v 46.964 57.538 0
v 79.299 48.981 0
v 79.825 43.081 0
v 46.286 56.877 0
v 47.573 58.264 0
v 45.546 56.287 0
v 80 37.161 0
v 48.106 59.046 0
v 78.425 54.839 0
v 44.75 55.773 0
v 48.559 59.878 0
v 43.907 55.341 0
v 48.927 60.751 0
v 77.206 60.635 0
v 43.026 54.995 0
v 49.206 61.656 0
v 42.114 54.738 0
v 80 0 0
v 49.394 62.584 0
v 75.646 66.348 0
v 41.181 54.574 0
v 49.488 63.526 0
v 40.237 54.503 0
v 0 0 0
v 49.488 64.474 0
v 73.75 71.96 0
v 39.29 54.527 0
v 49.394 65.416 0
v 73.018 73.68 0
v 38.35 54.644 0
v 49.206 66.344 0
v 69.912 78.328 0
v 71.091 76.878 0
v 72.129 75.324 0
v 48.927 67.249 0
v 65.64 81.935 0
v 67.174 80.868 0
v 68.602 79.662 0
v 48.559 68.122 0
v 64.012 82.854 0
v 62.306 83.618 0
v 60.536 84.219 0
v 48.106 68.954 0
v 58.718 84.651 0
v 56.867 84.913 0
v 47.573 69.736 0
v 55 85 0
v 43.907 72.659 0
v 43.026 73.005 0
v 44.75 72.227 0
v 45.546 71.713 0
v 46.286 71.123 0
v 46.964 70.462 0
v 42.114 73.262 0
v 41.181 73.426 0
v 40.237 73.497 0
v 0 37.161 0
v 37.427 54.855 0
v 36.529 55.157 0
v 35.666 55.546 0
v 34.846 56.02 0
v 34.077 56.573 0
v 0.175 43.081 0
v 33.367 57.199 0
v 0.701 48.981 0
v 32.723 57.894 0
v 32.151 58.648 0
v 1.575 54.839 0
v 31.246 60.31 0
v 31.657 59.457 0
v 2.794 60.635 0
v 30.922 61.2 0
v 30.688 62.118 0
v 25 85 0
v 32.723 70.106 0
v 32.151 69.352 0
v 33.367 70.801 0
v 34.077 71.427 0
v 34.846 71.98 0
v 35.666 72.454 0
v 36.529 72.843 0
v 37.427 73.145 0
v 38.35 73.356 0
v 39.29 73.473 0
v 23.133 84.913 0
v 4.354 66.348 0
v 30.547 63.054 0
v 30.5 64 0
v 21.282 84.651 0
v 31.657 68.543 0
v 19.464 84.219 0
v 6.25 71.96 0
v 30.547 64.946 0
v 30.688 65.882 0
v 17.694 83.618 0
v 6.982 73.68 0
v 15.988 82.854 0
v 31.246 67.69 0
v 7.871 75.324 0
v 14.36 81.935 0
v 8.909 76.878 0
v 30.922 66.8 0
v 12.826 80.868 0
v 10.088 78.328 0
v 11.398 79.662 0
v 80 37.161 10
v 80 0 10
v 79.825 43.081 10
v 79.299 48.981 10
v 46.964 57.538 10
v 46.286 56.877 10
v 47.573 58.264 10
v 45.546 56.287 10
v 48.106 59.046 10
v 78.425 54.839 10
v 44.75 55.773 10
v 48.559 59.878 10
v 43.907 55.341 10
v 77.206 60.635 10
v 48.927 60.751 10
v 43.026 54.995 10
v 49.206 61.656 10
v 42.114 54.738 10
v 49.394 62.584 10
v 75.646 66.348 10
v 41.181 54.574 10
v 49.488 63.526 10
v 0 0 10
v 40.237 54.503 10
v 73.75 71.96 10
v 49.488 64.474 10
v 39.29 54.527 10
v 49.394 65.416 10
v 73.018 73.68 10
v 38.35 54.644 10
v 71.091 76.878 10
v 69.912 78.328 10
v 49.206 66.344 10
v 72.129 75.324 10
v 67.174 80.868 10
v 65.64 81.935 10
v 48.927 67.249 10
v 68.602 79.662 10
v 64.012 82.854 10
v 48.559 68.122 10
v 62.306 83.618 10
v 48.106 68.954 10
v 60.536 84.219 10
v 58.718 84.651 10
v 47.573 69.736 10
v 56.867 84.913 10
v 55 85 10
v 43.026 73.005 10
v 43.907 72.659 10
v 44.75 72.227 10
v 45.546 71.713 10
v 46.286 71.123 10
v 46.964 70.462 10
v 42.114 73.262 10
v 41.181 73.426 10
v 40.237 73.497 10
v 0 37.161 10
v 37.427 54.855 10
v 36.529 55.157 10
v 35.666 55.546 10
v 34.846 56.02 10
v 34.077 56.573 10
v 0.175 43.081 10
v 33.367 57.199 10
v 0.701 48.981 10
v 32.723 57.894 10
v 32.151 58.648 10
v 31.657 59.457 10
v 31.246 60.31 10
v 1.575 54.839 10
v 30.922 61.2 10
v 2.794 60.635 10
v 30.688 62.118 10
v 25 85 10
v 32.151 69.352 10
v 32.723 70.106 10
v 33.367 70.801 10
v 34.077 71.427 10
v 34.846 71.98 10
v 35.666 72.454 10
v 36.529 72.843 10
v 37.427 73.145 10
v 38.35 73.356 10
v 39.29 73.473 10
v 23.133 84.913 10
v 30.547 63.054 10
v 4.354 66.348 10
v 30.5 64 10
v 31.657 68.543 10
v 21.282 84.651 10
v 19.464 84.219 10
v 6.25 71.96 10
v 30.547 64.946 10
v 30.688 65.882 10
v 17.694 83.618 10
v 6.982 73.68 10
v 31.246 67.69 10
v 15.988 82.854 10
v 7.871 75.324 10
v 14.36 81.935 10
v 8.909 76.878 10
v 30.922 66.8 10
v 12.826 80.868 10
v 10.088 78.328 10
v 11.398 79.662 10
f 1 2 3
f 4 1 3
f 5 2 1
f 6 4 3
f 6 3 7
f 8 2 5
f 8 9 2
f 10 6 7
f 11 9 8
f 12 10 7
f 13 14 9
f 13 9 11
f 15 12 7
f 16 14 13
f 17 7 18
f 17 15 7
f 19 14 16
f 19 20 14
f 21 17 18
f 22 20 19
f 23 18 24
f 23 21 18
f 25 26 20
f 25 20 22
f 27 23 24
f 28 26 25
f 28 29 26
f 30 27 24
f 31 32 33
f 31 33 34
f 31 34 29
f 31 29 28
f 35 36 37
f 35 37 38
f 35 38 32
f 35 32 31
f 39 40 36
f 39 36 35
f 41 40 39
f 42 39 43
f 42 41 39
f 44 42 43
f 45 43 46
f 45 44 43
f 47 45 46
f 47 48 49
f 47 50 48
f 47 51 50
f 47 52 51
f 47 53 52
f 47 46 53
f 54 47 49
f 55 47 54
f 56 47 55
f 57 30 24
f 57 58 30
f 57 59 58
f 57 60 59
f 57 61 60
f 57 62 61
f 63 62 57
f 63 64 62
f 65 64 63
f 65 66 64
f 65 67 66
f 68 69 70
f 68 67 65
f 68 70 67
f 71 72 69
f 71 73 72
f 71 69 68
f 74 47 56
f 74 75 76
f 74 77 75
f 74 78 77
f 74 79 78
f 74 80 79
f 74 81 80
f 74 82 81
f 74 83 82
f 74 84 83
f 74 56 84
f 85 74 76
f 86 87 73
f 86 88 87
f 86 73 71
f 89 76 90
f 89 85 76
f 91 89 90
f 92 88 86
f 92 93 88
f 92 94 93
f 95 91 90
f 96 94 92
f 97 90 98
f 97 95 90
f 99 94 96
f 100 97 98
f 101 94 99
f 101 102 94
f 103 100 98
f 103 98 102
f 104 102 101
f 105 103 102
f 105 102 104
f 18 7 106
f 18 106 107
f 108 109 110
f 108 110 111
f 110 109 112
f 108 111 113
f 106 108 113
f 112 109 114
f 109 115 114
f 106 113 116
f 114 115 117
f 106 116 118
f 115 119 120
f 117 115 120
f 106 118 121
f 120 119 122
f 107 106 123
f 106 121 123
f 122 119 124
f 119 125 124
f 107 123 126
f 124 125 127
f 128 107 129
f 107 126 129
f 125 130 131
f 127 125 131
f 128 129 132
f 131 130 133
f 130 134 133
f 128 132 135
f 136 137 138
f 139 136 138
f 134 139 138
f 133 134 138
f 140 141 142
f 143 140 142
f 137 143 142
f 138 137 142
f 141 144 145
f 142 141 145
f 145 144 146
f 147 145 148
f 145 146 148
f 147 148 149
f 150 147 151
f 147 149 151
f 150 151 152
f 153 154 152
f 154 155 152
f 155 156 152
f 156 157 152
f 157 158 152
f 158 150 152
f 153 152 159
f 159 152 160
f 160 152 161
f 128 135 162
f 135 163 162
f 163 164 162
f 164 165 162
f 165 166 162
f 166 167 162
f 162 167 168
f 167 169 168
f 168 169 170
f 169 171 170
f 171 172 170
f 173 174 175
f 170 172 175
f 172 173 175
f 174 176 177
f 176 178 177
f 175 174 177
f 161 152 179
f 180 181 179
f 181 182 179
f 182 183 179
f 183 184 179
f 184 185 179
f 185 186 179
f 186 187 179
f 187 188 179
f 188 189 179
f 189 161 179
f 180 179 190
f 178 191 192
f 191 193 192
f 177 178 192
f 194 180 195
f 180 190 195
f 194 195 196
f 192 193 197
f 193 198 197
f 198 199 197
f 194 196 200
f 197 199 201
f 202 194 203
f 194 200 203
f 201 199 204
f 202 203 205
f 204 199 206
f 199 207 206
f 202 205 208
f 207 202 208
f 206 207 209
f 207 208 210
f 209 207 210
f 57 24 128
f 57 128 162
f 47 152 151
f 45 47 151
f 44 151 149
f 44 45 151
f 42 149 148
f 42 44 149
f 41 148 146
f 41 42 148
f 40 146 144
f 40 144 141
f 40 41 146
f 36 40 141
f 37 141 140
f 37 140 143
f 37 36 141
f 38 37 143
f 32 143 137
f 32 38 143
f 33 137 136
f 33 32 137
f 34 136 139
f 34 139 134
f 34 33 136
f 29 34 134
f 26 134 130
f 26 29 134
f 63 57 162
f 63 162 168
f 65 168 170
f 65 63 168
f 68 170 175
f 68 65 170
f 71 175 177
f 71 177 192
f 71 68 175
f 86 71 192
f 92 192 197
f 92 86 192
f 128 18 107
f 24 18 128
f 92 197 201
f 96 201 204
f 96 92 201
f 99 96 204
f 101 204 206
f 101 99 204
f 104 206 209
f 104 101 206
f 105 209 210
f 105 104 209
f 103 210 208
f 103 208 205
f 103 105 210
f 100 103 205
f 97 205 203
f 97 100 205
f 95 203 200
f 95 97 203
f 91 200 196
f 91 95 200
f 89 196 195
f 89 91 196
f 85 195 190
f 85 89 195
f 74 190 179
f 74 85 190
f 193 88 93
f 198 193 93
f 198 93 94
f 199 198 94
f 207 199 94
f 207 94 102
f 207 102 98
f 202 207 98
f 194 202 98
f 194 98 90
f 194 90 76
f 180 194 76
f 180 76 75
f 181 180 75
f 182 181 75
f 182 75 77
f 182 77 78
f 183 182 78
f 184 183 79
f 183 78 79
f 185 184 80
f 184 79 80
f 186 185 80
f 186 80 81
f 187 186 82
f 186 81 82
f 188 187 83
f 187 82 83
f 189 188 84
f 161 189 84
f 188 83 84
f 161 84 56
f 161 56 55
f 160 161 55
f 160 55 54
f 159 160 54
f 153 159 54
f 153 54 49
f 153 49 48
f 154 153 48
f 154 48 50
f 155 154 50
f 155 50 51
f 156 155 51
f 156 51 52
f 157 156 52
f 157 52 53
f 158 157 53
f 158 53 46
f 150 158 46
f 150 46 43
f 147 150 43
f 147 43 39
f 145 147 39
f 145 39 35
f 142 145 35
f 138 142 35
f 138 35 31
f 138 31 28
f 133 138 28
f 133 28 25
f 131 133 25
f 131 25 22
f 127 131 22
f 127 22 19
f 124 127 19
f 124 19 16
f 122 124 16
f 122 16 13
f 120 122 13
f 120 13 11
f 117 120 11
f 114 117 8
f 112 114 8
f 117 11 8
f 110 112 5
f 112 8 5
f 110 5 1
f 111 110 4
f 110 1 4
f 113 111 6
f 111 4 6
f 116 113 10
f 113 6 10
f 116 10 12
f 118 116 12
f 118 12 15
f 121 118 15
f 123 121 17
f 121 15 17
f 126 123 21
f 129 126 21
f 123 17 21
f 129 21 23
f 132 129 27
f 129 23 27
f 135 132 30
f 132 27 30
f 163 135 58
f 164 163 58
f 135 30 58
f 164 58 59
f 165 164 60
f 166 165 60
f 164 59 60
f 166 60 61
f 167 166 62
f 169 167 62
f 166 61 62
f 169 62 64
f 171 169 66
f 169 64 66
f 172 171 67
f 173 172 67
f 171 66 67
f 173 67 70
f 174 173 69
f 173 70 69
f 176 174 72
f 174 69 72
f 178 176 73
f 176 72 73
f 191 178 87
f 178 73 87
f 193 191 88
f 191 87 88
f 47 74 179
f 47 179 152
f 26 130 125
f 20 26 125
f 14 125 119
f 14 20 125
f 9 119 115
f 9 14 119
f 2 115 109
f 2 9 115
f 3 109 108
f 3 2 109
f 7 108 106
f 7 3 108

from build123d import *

# Parameters (mm, degrees)
BOSS_EXTRU_1_DEPTH = 10
D_GAGEMENT_M41_D   = 19


with BuildPart() as part:
    # Esquisse1 → Boss.-Extru.1 (new body)
    with BuildSketch(Plane.XY):
        with BuildLine():
            Line((0, 0), (0, 37.161178186))
            ThreePointArc((0, 37.161178186), (1.574901575, 54.838847716), (6.25, 71.959705454))
            ThreePointArc((6.25, 71.959705454), (13.580589093, 81.419410907), (25, 85))
            Line((25, 85), (55, 85))
            ThreePointArc((55, 85), (66.419410907, 81.419410907), (73.75, 71.959705454))
            ThreePointArc((73.75, 71.959705454), (78.425098425, 54.838847716), (80, 37.161178186))
            Line((80, 37.161178186), (80, 0))
            Line((80, 0), (0, 0))
        make_face()
    extrude(amount=BOSS_EXTRU_1_DEPTH)

    # Dégagement M41 (through all)
    with Locations(Plane.XY.offset(10)):
        with Locations((40, 64)):
            Hole(D_GAGEMENT_M41_D / 2)


solid = part.part
